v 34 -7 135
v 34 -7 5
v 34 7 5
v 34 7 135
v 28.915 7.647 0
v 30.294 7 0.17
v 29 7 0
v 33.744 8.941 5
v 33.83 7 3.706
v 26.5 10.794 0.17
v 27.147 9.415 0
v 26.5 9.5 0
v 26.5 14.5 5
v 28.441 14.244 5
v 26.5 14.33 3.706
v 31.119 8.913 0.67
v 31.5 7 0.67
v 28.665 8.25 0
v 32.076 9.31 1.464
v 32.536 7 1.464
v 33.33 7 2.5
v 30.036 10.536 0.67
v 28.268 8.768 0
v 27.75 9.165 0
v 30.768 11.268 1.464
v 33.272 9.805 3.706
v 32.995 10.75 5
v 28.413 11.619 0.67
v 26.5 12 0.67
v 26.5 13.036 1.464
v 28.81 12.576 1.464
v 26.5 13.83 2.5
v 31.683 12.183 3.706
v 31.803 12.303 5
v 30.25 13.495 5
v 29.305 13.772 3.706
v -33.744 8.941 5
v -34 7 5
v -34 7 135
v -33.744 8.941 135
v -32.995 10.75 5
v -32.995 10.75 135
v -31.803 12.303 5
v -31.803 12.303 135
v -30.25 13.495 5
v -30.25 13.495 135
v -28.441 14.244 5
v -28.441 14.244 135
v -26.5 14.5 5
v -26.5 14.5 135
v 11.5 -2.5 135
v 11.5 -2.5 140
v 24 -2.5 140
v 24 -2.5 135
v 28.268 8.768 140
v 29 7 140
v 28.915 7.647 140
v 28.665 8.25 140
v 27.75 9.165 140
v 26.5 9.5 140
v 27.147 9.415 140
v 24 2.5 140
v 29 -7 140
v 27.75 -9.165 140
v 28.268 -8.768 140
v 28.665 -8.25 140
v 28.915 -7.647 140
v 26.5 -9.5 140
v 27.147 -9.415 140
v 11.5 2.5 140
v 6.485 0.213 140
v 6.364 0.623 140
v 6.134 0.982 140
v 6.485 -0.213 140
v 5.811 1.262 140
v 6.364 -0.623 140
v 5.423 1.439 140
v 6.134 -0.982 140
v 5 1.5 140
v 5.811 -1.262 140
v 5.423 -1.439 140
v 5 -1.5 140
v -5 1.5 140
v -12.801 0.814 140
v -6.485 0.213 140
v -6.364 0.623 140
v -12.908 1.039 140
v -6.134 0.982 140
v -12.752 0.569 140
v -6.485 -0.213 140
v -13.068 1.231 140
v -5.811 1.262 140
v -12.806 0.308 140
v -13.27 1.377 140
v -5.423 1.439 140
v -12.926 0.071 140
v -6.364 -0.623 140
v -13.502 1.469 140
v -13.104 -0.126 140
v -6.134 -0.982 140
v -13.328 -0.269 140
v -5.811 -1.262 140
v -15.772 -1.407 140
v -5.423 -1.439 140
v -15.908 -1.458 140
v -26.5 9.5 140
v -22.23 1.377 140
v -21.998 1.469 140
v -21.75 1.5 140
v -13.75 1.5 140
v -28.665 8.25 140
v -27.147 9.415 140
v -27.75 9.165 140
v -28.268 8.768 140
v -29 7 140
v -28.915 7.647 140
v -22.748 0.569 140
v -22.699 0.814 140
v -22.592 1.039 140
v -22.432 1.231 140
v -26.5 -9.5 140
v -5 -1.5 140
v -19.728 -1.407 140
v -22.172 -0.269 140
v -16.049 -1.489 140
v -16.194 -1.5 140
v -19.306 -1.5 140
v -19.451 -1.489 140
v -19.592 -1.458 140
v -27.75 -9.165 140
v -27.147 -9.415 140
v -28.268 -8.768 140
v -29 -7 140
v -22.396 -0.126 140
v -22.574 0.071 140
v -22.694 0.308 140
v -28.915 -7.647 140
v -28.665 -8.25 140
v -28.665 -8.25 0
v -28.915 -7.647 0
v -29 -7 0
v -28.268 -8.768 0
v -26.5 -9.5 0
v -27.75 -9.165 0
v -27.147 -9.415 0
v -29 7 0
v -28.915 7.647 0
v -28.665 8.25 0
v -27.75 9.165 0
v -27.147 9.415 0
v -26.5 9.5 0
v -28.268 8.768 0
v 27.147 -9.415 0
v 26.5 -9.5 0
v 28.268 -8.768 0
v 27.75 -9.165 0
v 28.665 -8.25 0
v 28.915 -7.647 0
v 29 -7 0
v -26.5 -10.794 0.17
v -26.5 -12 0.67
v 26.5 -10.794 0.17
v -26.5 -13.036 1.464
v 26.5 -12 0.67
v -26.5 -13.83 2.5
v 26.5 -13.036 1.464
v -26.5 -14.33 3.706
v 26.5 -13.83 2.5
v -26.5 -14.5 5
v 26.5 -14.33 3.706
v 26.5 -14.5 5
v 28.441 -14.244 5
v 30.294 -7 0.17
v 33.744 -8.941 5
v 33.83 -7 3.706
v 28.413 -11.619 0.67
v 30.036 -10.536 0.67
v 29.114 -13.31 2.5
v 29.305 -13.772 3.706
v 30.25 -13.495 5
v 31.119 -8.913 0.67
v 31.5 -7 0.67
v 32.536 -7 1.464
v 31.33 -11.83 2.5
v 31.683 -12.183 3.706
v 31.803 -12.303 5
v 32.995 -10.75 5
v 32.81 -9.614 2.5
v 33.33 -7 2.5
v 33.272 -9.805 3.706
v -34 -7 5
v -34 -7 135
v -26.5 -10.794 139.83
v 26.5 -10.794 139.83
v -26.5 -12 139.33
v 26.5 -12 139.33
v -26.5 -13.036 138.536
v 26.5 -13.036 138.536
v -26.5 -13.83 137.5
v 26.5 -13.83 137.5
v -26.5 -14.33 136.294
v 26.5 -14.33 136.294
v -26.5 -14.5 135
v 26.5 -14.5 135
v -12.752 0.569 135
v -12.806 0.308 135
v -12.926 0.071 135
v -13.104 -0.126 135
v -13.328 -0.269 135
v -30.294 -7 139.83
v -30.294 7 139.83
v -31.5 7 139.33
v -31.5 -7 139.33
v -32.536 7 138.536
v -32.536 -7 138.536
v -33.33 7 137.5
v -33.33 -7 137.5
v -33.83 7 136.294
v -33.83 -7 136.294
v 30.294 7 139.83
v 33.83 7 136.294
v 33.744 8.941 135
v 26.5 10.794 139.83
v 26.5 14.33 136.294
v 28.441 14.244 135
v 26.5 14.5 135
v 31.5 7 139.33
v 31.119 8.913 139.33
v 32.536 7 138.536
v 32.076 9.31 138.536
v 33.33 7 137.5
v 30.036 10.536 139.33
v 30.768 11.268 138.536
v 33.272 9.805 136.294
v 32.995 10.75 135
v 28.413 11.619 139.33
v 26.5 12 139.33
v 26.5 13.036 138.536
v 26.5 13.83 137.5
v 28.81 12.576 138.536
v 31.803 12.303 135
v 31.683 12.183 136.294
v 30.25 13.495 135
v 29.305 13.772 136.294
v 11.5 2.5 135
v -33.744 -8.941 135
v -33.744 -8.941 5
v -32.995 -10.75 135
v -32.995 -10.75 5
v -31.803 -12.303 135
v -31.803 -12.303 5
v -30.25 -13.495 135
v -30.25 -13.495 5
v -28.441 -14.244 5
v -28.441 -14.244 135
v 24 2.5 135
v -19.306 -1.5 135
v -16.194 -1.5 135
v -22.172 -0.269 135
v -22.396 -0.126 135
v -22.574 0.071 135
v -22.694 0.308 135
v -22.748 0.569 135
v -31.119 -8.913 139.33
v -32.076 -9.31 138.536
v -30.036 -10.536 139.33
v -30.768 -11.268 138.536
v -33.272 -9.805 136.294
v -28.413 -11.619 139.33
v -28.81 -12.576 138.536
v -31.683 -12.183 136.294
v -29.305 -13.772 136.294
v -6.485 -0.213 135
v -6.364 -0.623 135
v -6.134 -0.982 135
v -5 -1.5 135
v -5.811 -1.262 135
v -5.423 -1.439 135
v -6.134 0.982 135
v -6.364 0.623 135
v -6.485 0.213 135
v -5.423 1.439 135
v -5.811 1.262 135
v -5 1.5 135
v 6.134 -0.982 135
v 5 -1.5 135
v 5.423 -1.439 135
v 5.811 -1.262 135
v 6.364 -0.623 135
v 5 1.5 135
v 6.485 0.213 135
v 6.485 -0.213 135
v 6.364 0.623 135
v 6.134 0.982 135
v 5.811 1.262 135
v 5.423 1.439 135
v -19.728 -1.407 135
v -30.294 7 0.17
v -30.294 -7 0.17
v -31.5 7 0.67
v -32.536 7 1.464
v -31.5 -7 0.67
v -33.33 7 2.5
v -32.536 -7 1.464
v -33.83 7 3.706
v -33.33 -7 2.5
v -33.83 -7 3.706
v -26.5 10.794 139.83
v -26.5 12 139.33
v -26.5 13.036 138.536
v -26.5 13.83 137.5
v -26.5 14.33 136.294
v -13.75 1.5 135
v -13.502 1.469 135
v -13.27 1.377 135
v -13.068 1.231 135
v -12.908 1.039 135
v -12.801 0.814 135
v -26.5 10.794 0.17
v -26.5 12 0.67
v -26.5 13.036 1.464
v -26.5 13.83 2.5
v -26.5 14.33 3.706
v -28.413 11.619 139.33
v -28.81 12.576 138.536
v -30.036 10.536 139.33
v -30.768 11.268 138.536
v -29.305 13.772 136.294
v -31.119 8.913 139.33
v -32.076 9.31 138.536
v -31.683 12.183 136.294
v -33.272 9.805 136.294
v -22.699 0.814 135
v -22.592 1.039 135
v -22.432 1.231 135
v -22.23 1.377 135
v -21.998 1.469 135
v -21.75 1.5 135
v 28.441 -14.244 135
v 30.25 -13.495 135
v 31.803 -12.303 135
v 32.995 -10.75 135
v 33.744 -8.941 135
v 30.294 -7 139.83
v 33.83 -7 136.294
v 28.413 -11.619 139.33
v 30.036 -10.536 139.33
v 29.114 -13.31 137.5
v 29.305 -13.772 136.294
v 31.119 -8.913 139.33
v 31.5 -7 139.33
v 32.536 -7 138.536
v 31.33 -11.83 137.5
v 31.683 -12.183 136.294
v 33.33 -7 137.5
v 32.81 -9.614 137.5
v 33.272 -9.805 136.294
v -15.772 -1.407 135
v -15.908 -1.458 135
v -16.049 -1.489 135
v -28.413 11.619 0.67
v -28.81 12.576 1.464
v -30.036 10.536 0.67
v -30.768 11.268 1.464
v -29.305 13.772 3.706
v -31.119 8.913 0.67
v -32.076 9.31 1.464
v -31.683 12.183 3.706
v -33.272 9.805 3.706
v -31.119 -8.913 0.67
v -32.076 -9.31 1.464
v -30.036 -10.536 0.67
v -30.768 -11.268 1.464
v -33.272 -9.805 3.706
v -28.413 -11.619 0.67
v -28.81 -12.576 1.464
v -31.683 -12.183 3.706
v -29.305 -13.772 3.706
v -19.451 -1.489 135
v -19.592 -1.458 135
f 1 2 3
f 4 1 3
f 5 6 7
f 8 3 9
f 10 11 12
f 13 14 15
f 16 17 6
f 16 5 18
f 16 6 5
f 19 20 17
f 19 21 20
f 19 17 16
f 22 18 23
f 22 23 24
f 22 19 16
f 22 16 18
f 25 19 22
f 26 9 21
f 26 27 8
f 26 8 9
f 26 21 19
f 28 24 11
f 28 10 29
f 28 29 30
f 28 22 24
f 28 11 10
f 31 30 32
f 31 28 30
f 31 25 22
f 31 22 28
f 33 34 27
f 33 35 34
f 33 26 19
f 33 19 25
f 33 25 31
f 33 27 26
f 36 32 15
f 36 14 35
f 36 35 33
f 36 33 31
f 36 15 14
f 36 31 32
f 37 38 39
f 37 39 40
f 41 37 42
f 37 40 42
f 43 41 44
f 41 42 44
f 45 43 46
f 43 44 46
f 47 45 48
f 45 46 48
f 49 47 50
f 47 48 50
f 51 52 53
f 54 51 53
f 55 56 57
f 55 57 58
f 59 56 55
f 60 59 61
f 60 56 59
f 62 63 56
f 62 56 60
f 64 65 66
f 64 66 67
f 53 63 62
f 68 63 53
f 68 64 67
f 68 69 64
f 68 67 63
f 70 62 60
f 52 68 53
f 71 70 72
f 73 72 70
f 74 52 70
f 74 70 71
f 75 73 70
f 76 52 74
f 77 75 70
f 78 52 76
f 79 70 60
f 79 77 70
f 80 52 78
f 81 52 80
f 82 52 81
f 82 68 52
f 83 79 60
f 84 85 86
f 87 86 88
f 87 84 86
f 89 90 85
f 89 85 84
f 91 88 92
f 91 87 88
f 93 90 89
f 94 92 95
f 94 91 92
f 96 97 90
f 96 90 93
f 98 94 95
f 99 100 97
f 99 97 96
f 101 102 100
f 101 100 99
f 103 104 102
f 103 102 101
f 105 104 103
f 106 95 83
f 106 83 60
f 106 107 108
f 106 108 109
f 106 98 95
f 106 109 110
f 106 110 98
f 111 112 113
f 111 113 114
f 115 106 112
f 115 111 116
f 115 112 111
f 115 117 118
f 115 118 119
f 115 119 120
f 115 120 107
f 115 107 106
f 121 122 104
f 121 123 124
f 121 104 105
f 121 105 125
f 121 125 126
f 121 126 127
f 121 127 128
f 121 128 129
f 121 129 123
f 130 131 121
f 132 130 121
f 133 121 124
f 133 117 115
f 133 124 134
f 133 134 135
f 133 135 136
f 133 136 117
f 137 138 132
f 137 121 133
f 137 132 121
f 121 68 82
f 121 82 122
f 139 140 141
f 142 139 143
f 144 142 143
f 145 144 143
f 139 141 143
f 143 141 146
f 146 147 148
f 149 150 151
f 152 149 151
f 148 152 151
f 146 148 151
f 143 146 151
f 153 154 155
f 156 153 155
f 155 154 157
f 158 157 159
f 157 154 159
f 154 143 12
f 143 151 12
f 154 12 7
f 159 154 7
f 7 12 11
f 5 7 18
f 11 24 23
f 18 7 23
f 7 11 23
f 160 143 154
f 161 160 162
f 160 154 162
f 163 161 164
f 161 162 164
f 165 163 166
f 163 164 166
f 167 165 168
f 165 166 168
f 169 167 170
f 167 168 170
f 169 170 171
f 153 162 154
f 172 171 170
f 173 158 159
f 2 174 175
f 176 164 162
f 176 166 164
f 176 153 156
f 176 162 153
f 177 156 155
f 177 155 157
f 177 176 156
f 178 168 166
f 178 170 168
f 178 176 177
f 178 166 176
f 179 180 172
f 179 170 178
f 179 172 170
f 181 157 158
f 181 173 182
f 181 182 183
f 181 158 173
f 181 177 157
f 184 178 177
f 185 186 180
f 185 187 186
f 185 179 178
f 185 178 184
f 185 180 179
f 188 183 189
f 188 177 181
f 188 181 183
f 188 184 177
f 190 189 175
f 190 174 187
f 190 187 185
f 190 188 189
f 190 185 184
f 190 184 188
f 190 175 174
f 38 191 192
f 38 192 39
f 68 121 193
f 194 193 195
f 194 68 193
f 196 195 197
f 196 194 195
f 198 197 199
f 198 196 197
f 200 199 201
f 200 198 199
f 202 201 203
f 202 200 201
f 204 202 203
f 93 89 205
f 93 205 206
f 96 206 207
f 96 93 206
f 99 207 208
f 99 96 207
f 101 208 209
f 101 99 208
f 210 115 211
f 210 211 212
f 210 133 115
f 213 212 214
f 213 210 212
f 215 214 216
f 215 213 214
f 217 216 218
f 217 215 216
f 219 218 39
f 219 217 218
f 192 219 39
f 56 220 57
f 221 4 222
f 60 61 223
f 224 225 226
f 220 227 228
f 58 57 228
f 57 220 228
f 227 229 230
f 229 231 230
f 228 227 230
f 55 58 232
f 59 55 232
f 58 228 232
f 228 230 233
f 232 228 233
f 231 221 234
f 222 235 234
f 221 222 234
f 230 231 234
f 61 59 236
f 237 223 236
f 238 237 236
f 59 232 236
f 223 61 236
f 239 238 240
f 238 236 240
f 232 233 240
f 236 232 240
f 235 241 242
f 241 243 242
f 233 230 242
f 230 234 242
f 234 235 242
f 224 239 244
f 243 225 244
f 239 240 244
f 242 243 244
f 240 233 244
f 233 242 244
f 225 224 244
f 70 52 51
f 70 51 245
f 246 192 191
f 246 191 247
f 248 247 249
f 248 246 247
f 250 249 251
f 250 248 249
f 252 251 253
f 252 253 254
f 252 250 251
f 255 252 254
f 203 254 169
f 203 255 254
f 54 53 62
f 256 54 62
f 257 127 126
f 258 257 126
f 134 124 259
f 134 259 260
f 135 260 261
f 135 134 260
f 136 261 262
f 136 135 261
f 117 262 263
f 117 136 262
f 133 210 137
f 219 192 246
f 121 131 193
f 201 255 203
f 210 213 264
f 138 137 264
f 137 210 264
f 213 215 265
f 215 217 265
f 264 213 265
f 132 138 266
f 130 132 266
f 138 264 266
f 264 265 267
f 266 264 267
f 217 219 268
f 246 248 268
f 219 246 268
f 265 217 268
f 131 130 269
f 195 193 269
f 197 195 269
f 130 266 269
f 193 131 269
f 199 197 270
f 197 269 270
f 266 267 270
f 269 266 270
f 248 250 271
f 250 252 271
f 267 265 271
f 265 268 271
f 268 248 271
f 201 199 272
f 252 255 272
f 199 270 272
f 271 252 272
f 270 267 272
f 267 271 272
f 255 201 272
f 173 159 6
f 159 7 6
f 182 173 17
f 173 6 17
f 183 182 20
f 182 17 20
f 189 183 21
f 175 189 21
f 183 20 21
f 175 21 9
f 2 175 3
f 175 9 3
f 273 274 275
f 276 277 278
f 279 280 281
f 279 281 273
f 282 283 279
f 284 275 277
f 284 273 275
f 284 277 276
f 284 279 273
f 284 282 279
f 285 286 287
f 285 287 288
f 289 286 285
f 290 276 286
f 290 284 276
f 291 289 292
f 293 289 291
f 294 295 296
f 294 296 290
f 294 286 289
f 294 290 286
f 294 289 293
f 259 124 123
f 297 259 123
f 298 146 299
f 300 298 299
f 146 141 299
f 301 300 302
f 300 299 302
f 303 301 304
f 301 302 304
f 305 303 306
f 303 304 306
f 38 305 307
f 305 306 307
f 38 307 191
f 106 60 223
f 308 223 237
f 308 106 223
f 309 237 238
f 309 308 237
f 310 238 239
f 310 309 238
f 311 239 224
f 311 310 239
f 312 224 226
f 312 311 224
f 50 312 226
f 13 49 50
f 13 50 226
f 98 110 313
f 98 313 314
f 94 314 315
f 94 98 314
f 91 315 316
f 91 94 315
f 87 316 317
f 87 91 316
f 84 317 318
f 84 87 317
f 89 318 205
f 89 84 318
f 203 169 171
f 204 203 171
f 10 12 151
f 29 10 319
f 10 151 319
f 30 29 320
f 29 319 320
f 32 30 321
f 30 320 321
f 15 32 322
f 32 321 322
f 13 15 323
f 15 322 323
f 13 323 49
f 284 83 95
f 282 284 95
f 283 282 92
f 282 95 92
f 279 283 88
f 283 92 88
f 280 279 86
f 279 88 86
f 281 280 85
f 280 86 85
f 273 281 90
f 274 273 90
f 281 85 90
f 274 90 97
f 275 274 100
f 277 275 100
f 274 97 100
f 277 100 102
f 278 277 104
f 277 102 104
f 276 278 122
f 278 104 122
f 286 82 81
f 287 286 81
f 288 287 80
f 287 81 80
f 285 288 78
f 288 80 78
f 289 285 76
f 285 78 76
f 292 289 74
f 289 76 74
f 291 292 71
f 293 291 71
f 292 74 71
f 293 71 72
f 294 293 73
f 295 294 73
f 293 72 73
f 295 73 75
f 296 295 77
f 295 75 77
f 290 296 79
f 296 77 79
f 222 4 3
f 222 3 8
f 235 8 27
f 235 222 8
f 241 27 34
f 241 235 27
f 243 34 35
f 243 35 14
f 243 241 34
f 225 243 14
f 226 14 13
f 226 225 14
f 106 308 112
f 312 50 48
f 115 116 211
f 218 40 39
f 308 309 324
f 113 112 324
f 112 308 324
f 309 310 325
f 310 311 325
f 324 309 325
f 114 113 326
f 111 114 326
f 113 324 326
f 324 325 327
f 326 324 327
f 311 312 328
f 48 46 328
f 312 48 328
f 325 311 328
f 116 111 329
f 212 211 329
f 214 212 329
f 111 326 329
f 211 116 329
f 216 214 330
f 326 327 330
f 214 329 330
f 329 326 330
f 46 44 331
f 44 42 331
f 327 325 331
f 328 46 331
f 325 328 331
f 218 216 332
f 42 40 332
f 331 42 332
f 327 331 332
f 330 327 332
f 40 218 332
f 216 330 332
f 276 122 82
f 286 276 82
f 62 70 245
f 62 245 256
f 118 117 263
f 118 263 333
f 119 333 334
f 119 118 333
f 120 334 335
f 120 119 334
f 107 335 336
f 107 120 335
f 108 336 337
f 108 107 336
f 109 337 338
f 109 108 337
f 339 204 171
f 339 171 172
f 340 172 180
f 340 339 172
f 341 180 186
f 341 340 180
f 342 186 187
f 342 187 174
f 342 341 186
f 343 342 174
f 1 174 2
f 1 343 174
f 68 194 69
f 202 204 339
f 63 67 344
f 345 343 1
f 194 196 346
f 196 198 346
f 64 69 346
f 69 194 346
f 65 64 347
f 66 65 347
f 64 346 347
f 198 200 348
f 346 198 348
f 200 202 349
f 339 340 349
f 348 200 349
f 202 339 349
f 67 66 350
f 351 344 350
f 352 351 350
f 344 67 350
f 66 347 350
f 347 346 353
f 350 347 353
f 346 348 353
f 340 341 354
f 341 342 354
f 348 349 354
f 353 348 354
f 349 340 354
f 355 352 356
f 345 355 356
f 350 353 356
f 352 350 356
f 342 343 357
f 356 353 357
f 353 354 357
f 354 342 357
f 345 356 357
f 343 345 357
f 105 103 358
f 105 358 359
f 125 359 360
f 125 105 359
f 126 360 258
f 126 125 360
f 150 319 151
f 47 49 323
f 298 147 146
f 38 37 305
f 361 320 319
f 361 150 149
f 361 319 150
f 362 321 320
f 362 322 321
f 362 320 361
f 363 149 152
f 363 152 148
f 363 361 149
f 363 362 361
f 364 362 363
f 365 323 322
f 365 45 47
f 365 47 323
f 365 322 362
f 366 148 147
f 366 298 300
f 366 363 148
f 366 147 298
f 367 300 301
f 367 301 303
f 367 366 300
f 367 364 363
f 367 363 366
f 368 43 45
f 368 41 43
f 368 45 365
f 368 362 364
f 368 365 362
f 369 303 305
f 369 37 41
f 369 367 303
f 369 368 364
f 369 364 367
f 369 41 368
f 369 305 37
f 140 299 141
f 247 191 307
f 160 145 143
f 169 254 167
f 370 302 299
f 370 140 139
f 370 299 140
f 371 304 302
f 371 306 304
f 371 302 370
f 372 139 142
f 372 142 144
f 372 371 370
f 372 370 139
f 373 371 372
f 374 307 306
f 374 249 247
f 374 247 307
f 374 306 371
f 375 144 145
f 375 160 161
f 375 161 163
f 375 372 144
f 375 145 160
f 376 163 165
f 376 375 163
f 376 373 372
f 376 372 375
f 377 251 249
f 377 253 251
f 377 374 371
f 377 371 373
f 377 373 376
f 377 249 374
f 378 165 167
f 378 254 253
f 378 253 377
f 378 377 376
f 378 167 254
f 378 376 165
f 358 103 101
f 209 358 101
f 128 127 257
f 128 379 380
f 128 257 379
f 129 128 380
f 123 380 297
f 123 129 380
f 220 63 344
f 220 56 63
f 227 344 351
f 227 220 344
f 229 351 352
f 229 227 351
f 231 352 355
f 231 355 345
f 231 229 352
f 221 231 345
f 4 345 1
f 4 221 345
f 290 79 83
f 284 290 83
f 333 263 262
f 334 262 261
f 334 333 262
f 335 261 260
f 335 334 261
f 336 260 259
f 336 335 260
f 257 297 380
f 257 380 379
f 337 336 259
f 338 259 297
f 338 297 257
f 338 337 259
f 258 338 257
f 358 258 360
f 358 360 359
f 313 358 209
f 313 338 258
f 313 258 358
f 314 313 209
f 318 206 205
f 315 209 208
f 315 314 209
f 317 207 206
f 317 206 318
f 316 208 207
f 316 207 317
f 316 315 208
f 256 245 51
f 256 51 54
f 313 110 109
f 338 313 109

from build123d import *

# Parameters (mm, degrees)
ESQUISSE1_W             = 68
ESQUISSE1_H             = 29
BOSS_EXTRU_1_DEPTH      = 140
CONG_1_R                = 7.5
CONG_2_R                = 5
ESQUISSE2_W             = 12.5
ESQUISSE2_H             = 5
ENL_V_MAT_EXTRU_1_DEPTH = 5
CONG_3_R                = 1


with BuildPart() as part:
    # Esquisse1 → Boss.-Extru.1 (new body)
    with BuildSketch(Plane.XY):
        Rectangle(ESQUISSE1_W, ESQUISSE1_H)
    extrude(amount=BOSS_EXTRU_1_DEPTH)

    # Congé1
    cong_1_edges = [part.edges().sort_by_distance(p)[0] for p in [
        (-34, 14.5, 70),
        (34, 14.5, 70),
        (34, -14.5, 70),
        (-34, -14.5, 70),
    ]]
    fillet(cong_1_edges, radius=CONG_1_R)

    # Congé2
    cong_2_edges = [part.edges().sort_by_distance(p)[0] for p in [
        (34, 0, 0),
        (34, 0, 140),
        (-34, 0, 0),
        (0, 14.5, 0),
        (0, -14.5, 0),
        (-31.803300859, 12.303300859, 0),
        (-31.803300859, -12.303300859, 0),
        (31.803300859, 12.303300859, 0),
        (31.803300859, -12.303300859, 0),
        (0, -14.5, 140),
        (-34, 0, 140),
        (0, 14.5, 140),
        (-31.803300859, 12.303300859, 140),
        (-31.803300859, -12.303300859, 140),
        (31.803300859, 12.303300859, 140),
        (31.803300859, -12.303300859, 140),
    ]]
    fillet(cong_2_edges, radius=CONG_2_R)

    # Esquisse2 → Enlèv. mat.-Extru.1 (cut)
    with BuildSketch(Plane.XY.offset(140)):
        Polygon((-12.75, 1.5), (-22.75, 1.5), (-22.75, 0), (-19.52732972, -1.5), (-15.97267028, -1.5), (-12.75, 0), align=None)
        with BuildLine():
            Line((5, 1.5), (-5, 1.5))
            ThreePointArc((-5, 1.5), (-6.5, 0), (-5, -1.5))
            Line((-5, -1.5), (5, -1.5))
            ThreePointArc((5, -1.5), (6.5, 0), (5, 1.5))
        make_face()
        with Locations((17.75, 0)):
            Rectangle(ESQUISSE2_W, ESQUISSE2_H)
    extrude(amount=-ENL_V_MAT_EXTRU_1_DEPTH, mode=Mode.SUBTRACT)

    # Congé3
    # the kernel refuses this fillet: 1 mm, written as the material it adds along each edge
    with BuildSketch(Plane(origin=(-15.97267028, -1.5, 140), x_dir=(0.9066045100812768, 0.4219813530243817, 0), z_dir=(0, 0, -1)), Plane(origin=(-19.52732972, -1.5, 140), x_dir=(1, 0, 0), z_dir=(0, 0, -1))) as cong_3_piece_1:
        with BuildLine():
            CenterArc((CONG_3_R * 0.221326106591, -CONG_3_R), CONG_3_R, 90, 24.959741925)
            Line((-CONG_3_R * 0.200655246434, -CONG_3_R * 0.0933954899187), (0, 0))
            Line((0, 0), (CONG_3_R * 0.221326106591, 0))
        make_face()
    extrude(amount=5.553315266)
    with BuildSketch(Plane(origin=(-22.75, 0, 140), x_dir=(0.9066045100812758, -0.42198135302438383, 0), z_dir=(0, 0, -1))) as cong_3_piece_2:
        with BuildLine():
            CenterArc((CONG_3_R * 0.637564274773, -CONG_3_R), CONG_3_R, 90, 65.040258075)
            Line((-CONG_3_R * 0.269040235309, -CONG_3_R * 0.578018646976), (0, 0))
            Line((0, 0), (CONG_3_R * 0.637564274773, 0))
        make_face()
    extrude(amount=6.593910687)
    with BuildSketch(Plane(origin=(-22.75, 1.5, 140), x_dir=(0, -1, 0), z_dir=(0, 0, -1)), Plane(origin=(-12.75, 1.5, 140), x_dir=(-1, 0, 0), z_dir=(0, 0, -1))) as cong_3_piece_3:
        with BuildLine():
            CenterArc((CONG_3_R, -CONG_3_R), CONG_3_R, 90, 90)
            Line((0, -CONG_3_R), (0, 0))
            Line((0, 0), (CONG_3_R, 0))
        make_face()
    extrude(amount=7.5)
    with BuildSketch(Plane(origin=(-12.75, 0, 140), x_dir=(-0.906604510081276, -0.4219813530243839, 0), z_dir=(0, 0, -1))) as cong_3_piece_4:
        with BuildLine():
            CenterArc((CONG_3_R * 0.637564274773, CONG_3_R), CONG_3_R, 204.959741925, 65.040258075)
            Line((-CONG_3_R * 0.269040235309, CONG_3_R * 0.578018646976), (0, 0))
            Line((0, 0), (CONG_3_R * 0.637564274773, 0))
        make_face()
    extrude(amount=6.593910687)


solid = part.part
